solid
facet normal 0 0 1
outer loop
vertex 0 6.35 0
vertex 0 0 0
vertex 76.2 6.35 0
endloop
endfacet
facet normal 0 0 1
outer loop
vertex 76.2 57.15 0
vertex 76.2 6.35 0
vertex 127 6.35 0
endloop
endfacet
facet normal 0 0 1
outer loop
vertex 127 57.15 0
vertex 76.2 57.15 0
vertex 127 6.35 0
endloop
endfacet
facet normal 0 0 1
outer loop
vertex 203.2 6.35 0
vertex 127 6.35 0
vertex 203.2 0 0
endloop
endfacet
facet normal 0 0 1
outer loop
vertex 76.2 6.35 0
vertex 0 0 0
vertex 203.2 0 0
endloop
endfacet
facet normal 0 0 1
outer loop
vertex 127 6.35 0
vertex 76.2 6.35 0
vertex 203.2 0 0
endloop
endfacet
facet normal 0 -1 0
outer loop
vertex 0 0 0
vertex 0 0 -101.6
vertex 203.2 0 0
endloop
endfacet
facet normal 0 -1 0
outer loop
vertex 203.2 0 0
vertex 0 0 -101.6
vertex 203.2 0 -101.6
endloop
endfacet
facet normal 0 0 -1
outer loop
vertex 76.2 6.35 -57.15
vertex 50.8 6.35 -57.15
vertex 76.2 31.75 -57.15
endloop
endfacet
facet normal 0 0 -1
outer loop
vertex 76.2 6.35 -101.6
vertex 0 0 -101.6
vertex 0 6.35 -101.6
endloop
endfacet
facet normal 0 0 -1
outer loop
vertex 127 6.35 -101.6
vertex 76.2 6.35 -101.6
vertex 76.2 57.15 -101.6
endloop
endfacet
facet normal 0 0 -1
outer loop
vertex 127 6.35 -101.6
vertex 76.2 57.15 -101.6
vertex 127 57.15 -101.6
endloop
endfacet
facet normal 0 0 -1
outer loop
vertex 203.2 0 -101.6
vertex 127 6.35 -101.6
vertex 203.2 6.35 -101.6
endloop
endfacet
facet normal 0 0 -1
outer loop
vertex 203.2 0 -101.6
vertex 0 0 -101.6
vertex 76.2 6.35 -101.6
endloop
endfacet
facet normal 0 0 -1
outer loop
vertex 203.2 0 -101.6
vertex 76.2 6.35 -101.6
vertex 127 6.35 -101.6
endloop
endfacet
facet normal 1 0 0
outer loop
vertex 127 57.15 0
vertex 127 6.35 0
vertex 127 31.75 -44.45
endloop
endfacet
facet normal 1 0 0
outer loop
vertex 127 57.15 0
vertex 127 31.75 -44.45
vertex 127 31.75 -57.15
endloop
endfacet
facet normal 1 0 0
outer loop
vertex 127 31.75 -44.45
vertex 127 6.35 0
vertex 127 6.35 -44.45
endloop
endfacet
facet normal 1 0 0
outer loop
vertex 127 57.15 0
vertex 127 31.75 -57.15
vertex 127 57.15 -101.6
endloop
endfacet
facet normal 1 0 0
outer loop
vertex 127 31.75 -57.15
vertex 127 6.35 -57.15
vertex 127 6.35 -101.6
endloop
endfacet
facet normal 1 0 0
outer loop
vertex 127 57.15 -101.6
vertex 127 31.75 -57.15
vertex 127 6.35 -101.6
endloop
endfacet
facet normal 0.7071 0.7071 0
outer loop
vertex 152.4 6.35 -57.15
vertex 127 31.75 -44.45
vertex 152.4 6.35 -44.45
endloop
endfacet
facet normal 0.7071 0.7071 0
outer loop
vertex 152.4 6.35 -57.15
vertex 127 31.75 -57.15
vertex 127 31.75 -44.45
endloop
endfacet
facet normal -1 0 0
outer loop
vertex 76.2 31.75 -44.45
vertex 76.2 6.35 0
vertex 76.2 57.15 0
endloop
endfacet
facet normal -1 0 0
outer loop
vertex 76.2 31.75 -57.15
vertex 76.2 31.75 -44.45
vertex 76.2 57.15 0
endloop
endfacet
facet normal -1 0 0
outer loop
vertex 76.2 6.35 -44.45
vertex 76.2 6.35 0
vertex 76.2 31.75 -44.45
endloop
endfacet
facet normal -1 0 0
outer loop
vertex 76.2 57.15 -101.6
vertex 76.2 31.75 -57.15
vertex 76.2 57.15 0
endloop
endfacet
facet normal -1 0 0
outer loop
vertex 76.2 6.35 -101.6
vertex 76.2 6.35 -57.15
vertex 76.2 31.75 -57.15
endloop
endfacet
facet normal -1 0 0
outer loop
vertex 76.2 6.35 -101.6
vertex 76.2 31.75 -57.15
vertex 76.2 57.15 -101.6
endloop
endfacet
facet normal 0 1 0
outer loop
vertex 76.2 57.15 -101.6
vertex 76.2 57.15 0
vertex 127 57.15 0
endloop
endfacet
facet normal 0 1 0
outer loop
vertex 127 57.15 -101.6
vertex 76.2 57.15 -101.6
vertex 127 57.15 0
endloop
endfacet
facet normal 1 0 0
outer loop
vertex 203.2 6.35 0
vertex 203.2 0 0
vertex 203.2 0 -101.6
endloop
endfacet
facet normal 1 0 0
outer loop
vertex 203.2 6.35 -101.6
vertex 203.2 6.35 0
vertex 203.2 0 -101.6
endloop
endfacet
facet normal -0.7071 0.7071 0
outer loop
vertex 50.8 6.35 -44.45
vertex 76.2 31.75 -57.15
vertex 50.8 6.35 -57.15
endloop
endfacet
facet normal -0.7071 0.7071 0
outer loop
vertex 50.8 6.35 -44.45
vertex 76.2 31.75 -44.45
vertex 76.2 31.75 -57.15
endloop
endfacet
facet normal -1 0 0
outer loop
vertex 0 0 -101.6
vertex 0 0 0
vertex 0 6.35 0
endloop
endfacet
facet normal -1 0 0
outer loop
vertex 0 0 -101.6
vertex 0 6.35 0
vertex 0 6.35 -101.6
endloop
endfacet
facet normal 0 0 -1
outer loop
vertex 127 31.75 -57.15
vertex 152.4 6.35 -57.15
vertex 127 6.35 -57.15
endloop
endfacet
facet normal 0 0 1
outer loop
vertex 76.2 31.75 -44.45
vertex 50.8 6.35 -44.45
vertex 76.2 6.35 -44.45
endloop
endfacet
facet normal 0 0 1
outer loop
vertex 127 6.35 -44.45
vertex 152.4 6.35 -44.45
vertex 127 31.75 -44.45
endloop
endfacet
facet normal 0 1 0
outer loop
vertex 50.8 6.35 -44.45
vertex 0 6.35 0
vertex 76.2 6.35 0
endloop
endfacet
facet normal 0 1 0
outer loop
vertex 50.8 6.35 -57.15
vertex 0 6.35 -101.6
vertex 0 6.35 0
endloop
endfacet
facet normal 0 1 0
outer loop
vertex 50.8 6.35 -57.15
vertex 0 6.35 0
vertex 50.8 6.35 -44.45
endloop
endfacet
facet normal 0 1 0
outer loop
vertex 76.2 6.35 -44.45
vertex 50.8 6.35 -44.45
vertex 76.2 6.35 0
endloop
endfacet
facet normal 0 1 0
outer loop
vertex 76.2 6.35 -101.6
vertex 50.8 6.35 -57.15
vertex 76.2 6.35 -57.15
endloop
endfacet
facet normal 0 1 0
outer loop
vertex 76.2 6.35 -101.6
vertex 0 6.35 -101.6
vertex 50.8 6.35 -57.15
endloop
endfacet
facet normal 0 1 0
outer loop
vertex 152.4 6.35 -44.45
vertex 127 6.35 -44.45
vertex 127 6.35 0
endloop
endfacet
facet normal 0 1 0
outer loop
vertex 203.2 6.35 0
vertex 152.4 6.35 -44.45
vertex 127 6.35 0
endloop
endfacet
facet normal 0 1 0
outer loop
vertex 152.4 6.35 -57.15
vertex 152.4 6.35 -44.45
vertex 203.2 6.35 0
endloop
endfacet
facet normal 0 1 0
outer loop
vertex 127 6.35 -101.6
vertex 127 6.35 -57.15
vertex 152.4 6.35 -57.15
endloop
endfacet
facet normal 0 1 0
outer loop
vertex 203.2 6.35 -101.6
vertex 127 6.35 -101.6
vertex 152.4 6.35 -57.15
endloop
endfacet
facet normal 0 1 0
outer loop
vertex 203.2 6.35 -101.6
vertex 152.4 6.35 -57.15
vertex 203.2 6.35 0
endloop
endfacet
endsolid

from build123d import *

# Parameters (mm, degrees)
SKETCH1_W           = 203.2
SKETCH1_H           = 101.6
BOSS_EXTRUDE2_DEPTH = 6.35
SKETCH3_W           = 50.8
SKETCH3_H           = 101.6
BOSS_EXTRUDE3_DEPTH = 50.8
BOSS_EXTRUDE4_DEPTH = 6.35


with BuildPart() as part:
    # Sketch1 → Boss-Extrude2 (new body)
    with BuildSketch(Plane(origin=(0, 0, 0), x_dir=(1, 0, 0), z_dir=(0, 1, 0))):
        with Locations((101.6, 50.8)):
            Rectangle(SKETCH1_W, SKETCH1_H)
    extrude(amount=BOSS_EXTRUDE2_DEPTH)

    # Sketch3 → Boss-Extrude3 (add)
    with BuildSketch(Plane(origin=(0, 6.35, 0), x_dir=(1, 0, 0), z_dir=(0, 1, 0))):
        with Locations((101.6, 50.8)):
            Rectangle(SKETCH3_W, SKETCH3_H)
    extrude(amount=BOSS_EXTRUDE3_DEPTH)

    # Sketch4 → Boss-Extrude4 (add, symmetric)
    with BuildSketch(Plane.XY.offset(-50.8)):
        Polygon((127, 31.75), (152.4, 6.35), (127, 6.35), align=None)
        Polygon((76.2, 31.75), (50.8, 6.35), (76.2, 6.35), align=None)
    extrude(amount=BOSS_EXTRUDE4_DEPTH, both=True)


solid = part.part
